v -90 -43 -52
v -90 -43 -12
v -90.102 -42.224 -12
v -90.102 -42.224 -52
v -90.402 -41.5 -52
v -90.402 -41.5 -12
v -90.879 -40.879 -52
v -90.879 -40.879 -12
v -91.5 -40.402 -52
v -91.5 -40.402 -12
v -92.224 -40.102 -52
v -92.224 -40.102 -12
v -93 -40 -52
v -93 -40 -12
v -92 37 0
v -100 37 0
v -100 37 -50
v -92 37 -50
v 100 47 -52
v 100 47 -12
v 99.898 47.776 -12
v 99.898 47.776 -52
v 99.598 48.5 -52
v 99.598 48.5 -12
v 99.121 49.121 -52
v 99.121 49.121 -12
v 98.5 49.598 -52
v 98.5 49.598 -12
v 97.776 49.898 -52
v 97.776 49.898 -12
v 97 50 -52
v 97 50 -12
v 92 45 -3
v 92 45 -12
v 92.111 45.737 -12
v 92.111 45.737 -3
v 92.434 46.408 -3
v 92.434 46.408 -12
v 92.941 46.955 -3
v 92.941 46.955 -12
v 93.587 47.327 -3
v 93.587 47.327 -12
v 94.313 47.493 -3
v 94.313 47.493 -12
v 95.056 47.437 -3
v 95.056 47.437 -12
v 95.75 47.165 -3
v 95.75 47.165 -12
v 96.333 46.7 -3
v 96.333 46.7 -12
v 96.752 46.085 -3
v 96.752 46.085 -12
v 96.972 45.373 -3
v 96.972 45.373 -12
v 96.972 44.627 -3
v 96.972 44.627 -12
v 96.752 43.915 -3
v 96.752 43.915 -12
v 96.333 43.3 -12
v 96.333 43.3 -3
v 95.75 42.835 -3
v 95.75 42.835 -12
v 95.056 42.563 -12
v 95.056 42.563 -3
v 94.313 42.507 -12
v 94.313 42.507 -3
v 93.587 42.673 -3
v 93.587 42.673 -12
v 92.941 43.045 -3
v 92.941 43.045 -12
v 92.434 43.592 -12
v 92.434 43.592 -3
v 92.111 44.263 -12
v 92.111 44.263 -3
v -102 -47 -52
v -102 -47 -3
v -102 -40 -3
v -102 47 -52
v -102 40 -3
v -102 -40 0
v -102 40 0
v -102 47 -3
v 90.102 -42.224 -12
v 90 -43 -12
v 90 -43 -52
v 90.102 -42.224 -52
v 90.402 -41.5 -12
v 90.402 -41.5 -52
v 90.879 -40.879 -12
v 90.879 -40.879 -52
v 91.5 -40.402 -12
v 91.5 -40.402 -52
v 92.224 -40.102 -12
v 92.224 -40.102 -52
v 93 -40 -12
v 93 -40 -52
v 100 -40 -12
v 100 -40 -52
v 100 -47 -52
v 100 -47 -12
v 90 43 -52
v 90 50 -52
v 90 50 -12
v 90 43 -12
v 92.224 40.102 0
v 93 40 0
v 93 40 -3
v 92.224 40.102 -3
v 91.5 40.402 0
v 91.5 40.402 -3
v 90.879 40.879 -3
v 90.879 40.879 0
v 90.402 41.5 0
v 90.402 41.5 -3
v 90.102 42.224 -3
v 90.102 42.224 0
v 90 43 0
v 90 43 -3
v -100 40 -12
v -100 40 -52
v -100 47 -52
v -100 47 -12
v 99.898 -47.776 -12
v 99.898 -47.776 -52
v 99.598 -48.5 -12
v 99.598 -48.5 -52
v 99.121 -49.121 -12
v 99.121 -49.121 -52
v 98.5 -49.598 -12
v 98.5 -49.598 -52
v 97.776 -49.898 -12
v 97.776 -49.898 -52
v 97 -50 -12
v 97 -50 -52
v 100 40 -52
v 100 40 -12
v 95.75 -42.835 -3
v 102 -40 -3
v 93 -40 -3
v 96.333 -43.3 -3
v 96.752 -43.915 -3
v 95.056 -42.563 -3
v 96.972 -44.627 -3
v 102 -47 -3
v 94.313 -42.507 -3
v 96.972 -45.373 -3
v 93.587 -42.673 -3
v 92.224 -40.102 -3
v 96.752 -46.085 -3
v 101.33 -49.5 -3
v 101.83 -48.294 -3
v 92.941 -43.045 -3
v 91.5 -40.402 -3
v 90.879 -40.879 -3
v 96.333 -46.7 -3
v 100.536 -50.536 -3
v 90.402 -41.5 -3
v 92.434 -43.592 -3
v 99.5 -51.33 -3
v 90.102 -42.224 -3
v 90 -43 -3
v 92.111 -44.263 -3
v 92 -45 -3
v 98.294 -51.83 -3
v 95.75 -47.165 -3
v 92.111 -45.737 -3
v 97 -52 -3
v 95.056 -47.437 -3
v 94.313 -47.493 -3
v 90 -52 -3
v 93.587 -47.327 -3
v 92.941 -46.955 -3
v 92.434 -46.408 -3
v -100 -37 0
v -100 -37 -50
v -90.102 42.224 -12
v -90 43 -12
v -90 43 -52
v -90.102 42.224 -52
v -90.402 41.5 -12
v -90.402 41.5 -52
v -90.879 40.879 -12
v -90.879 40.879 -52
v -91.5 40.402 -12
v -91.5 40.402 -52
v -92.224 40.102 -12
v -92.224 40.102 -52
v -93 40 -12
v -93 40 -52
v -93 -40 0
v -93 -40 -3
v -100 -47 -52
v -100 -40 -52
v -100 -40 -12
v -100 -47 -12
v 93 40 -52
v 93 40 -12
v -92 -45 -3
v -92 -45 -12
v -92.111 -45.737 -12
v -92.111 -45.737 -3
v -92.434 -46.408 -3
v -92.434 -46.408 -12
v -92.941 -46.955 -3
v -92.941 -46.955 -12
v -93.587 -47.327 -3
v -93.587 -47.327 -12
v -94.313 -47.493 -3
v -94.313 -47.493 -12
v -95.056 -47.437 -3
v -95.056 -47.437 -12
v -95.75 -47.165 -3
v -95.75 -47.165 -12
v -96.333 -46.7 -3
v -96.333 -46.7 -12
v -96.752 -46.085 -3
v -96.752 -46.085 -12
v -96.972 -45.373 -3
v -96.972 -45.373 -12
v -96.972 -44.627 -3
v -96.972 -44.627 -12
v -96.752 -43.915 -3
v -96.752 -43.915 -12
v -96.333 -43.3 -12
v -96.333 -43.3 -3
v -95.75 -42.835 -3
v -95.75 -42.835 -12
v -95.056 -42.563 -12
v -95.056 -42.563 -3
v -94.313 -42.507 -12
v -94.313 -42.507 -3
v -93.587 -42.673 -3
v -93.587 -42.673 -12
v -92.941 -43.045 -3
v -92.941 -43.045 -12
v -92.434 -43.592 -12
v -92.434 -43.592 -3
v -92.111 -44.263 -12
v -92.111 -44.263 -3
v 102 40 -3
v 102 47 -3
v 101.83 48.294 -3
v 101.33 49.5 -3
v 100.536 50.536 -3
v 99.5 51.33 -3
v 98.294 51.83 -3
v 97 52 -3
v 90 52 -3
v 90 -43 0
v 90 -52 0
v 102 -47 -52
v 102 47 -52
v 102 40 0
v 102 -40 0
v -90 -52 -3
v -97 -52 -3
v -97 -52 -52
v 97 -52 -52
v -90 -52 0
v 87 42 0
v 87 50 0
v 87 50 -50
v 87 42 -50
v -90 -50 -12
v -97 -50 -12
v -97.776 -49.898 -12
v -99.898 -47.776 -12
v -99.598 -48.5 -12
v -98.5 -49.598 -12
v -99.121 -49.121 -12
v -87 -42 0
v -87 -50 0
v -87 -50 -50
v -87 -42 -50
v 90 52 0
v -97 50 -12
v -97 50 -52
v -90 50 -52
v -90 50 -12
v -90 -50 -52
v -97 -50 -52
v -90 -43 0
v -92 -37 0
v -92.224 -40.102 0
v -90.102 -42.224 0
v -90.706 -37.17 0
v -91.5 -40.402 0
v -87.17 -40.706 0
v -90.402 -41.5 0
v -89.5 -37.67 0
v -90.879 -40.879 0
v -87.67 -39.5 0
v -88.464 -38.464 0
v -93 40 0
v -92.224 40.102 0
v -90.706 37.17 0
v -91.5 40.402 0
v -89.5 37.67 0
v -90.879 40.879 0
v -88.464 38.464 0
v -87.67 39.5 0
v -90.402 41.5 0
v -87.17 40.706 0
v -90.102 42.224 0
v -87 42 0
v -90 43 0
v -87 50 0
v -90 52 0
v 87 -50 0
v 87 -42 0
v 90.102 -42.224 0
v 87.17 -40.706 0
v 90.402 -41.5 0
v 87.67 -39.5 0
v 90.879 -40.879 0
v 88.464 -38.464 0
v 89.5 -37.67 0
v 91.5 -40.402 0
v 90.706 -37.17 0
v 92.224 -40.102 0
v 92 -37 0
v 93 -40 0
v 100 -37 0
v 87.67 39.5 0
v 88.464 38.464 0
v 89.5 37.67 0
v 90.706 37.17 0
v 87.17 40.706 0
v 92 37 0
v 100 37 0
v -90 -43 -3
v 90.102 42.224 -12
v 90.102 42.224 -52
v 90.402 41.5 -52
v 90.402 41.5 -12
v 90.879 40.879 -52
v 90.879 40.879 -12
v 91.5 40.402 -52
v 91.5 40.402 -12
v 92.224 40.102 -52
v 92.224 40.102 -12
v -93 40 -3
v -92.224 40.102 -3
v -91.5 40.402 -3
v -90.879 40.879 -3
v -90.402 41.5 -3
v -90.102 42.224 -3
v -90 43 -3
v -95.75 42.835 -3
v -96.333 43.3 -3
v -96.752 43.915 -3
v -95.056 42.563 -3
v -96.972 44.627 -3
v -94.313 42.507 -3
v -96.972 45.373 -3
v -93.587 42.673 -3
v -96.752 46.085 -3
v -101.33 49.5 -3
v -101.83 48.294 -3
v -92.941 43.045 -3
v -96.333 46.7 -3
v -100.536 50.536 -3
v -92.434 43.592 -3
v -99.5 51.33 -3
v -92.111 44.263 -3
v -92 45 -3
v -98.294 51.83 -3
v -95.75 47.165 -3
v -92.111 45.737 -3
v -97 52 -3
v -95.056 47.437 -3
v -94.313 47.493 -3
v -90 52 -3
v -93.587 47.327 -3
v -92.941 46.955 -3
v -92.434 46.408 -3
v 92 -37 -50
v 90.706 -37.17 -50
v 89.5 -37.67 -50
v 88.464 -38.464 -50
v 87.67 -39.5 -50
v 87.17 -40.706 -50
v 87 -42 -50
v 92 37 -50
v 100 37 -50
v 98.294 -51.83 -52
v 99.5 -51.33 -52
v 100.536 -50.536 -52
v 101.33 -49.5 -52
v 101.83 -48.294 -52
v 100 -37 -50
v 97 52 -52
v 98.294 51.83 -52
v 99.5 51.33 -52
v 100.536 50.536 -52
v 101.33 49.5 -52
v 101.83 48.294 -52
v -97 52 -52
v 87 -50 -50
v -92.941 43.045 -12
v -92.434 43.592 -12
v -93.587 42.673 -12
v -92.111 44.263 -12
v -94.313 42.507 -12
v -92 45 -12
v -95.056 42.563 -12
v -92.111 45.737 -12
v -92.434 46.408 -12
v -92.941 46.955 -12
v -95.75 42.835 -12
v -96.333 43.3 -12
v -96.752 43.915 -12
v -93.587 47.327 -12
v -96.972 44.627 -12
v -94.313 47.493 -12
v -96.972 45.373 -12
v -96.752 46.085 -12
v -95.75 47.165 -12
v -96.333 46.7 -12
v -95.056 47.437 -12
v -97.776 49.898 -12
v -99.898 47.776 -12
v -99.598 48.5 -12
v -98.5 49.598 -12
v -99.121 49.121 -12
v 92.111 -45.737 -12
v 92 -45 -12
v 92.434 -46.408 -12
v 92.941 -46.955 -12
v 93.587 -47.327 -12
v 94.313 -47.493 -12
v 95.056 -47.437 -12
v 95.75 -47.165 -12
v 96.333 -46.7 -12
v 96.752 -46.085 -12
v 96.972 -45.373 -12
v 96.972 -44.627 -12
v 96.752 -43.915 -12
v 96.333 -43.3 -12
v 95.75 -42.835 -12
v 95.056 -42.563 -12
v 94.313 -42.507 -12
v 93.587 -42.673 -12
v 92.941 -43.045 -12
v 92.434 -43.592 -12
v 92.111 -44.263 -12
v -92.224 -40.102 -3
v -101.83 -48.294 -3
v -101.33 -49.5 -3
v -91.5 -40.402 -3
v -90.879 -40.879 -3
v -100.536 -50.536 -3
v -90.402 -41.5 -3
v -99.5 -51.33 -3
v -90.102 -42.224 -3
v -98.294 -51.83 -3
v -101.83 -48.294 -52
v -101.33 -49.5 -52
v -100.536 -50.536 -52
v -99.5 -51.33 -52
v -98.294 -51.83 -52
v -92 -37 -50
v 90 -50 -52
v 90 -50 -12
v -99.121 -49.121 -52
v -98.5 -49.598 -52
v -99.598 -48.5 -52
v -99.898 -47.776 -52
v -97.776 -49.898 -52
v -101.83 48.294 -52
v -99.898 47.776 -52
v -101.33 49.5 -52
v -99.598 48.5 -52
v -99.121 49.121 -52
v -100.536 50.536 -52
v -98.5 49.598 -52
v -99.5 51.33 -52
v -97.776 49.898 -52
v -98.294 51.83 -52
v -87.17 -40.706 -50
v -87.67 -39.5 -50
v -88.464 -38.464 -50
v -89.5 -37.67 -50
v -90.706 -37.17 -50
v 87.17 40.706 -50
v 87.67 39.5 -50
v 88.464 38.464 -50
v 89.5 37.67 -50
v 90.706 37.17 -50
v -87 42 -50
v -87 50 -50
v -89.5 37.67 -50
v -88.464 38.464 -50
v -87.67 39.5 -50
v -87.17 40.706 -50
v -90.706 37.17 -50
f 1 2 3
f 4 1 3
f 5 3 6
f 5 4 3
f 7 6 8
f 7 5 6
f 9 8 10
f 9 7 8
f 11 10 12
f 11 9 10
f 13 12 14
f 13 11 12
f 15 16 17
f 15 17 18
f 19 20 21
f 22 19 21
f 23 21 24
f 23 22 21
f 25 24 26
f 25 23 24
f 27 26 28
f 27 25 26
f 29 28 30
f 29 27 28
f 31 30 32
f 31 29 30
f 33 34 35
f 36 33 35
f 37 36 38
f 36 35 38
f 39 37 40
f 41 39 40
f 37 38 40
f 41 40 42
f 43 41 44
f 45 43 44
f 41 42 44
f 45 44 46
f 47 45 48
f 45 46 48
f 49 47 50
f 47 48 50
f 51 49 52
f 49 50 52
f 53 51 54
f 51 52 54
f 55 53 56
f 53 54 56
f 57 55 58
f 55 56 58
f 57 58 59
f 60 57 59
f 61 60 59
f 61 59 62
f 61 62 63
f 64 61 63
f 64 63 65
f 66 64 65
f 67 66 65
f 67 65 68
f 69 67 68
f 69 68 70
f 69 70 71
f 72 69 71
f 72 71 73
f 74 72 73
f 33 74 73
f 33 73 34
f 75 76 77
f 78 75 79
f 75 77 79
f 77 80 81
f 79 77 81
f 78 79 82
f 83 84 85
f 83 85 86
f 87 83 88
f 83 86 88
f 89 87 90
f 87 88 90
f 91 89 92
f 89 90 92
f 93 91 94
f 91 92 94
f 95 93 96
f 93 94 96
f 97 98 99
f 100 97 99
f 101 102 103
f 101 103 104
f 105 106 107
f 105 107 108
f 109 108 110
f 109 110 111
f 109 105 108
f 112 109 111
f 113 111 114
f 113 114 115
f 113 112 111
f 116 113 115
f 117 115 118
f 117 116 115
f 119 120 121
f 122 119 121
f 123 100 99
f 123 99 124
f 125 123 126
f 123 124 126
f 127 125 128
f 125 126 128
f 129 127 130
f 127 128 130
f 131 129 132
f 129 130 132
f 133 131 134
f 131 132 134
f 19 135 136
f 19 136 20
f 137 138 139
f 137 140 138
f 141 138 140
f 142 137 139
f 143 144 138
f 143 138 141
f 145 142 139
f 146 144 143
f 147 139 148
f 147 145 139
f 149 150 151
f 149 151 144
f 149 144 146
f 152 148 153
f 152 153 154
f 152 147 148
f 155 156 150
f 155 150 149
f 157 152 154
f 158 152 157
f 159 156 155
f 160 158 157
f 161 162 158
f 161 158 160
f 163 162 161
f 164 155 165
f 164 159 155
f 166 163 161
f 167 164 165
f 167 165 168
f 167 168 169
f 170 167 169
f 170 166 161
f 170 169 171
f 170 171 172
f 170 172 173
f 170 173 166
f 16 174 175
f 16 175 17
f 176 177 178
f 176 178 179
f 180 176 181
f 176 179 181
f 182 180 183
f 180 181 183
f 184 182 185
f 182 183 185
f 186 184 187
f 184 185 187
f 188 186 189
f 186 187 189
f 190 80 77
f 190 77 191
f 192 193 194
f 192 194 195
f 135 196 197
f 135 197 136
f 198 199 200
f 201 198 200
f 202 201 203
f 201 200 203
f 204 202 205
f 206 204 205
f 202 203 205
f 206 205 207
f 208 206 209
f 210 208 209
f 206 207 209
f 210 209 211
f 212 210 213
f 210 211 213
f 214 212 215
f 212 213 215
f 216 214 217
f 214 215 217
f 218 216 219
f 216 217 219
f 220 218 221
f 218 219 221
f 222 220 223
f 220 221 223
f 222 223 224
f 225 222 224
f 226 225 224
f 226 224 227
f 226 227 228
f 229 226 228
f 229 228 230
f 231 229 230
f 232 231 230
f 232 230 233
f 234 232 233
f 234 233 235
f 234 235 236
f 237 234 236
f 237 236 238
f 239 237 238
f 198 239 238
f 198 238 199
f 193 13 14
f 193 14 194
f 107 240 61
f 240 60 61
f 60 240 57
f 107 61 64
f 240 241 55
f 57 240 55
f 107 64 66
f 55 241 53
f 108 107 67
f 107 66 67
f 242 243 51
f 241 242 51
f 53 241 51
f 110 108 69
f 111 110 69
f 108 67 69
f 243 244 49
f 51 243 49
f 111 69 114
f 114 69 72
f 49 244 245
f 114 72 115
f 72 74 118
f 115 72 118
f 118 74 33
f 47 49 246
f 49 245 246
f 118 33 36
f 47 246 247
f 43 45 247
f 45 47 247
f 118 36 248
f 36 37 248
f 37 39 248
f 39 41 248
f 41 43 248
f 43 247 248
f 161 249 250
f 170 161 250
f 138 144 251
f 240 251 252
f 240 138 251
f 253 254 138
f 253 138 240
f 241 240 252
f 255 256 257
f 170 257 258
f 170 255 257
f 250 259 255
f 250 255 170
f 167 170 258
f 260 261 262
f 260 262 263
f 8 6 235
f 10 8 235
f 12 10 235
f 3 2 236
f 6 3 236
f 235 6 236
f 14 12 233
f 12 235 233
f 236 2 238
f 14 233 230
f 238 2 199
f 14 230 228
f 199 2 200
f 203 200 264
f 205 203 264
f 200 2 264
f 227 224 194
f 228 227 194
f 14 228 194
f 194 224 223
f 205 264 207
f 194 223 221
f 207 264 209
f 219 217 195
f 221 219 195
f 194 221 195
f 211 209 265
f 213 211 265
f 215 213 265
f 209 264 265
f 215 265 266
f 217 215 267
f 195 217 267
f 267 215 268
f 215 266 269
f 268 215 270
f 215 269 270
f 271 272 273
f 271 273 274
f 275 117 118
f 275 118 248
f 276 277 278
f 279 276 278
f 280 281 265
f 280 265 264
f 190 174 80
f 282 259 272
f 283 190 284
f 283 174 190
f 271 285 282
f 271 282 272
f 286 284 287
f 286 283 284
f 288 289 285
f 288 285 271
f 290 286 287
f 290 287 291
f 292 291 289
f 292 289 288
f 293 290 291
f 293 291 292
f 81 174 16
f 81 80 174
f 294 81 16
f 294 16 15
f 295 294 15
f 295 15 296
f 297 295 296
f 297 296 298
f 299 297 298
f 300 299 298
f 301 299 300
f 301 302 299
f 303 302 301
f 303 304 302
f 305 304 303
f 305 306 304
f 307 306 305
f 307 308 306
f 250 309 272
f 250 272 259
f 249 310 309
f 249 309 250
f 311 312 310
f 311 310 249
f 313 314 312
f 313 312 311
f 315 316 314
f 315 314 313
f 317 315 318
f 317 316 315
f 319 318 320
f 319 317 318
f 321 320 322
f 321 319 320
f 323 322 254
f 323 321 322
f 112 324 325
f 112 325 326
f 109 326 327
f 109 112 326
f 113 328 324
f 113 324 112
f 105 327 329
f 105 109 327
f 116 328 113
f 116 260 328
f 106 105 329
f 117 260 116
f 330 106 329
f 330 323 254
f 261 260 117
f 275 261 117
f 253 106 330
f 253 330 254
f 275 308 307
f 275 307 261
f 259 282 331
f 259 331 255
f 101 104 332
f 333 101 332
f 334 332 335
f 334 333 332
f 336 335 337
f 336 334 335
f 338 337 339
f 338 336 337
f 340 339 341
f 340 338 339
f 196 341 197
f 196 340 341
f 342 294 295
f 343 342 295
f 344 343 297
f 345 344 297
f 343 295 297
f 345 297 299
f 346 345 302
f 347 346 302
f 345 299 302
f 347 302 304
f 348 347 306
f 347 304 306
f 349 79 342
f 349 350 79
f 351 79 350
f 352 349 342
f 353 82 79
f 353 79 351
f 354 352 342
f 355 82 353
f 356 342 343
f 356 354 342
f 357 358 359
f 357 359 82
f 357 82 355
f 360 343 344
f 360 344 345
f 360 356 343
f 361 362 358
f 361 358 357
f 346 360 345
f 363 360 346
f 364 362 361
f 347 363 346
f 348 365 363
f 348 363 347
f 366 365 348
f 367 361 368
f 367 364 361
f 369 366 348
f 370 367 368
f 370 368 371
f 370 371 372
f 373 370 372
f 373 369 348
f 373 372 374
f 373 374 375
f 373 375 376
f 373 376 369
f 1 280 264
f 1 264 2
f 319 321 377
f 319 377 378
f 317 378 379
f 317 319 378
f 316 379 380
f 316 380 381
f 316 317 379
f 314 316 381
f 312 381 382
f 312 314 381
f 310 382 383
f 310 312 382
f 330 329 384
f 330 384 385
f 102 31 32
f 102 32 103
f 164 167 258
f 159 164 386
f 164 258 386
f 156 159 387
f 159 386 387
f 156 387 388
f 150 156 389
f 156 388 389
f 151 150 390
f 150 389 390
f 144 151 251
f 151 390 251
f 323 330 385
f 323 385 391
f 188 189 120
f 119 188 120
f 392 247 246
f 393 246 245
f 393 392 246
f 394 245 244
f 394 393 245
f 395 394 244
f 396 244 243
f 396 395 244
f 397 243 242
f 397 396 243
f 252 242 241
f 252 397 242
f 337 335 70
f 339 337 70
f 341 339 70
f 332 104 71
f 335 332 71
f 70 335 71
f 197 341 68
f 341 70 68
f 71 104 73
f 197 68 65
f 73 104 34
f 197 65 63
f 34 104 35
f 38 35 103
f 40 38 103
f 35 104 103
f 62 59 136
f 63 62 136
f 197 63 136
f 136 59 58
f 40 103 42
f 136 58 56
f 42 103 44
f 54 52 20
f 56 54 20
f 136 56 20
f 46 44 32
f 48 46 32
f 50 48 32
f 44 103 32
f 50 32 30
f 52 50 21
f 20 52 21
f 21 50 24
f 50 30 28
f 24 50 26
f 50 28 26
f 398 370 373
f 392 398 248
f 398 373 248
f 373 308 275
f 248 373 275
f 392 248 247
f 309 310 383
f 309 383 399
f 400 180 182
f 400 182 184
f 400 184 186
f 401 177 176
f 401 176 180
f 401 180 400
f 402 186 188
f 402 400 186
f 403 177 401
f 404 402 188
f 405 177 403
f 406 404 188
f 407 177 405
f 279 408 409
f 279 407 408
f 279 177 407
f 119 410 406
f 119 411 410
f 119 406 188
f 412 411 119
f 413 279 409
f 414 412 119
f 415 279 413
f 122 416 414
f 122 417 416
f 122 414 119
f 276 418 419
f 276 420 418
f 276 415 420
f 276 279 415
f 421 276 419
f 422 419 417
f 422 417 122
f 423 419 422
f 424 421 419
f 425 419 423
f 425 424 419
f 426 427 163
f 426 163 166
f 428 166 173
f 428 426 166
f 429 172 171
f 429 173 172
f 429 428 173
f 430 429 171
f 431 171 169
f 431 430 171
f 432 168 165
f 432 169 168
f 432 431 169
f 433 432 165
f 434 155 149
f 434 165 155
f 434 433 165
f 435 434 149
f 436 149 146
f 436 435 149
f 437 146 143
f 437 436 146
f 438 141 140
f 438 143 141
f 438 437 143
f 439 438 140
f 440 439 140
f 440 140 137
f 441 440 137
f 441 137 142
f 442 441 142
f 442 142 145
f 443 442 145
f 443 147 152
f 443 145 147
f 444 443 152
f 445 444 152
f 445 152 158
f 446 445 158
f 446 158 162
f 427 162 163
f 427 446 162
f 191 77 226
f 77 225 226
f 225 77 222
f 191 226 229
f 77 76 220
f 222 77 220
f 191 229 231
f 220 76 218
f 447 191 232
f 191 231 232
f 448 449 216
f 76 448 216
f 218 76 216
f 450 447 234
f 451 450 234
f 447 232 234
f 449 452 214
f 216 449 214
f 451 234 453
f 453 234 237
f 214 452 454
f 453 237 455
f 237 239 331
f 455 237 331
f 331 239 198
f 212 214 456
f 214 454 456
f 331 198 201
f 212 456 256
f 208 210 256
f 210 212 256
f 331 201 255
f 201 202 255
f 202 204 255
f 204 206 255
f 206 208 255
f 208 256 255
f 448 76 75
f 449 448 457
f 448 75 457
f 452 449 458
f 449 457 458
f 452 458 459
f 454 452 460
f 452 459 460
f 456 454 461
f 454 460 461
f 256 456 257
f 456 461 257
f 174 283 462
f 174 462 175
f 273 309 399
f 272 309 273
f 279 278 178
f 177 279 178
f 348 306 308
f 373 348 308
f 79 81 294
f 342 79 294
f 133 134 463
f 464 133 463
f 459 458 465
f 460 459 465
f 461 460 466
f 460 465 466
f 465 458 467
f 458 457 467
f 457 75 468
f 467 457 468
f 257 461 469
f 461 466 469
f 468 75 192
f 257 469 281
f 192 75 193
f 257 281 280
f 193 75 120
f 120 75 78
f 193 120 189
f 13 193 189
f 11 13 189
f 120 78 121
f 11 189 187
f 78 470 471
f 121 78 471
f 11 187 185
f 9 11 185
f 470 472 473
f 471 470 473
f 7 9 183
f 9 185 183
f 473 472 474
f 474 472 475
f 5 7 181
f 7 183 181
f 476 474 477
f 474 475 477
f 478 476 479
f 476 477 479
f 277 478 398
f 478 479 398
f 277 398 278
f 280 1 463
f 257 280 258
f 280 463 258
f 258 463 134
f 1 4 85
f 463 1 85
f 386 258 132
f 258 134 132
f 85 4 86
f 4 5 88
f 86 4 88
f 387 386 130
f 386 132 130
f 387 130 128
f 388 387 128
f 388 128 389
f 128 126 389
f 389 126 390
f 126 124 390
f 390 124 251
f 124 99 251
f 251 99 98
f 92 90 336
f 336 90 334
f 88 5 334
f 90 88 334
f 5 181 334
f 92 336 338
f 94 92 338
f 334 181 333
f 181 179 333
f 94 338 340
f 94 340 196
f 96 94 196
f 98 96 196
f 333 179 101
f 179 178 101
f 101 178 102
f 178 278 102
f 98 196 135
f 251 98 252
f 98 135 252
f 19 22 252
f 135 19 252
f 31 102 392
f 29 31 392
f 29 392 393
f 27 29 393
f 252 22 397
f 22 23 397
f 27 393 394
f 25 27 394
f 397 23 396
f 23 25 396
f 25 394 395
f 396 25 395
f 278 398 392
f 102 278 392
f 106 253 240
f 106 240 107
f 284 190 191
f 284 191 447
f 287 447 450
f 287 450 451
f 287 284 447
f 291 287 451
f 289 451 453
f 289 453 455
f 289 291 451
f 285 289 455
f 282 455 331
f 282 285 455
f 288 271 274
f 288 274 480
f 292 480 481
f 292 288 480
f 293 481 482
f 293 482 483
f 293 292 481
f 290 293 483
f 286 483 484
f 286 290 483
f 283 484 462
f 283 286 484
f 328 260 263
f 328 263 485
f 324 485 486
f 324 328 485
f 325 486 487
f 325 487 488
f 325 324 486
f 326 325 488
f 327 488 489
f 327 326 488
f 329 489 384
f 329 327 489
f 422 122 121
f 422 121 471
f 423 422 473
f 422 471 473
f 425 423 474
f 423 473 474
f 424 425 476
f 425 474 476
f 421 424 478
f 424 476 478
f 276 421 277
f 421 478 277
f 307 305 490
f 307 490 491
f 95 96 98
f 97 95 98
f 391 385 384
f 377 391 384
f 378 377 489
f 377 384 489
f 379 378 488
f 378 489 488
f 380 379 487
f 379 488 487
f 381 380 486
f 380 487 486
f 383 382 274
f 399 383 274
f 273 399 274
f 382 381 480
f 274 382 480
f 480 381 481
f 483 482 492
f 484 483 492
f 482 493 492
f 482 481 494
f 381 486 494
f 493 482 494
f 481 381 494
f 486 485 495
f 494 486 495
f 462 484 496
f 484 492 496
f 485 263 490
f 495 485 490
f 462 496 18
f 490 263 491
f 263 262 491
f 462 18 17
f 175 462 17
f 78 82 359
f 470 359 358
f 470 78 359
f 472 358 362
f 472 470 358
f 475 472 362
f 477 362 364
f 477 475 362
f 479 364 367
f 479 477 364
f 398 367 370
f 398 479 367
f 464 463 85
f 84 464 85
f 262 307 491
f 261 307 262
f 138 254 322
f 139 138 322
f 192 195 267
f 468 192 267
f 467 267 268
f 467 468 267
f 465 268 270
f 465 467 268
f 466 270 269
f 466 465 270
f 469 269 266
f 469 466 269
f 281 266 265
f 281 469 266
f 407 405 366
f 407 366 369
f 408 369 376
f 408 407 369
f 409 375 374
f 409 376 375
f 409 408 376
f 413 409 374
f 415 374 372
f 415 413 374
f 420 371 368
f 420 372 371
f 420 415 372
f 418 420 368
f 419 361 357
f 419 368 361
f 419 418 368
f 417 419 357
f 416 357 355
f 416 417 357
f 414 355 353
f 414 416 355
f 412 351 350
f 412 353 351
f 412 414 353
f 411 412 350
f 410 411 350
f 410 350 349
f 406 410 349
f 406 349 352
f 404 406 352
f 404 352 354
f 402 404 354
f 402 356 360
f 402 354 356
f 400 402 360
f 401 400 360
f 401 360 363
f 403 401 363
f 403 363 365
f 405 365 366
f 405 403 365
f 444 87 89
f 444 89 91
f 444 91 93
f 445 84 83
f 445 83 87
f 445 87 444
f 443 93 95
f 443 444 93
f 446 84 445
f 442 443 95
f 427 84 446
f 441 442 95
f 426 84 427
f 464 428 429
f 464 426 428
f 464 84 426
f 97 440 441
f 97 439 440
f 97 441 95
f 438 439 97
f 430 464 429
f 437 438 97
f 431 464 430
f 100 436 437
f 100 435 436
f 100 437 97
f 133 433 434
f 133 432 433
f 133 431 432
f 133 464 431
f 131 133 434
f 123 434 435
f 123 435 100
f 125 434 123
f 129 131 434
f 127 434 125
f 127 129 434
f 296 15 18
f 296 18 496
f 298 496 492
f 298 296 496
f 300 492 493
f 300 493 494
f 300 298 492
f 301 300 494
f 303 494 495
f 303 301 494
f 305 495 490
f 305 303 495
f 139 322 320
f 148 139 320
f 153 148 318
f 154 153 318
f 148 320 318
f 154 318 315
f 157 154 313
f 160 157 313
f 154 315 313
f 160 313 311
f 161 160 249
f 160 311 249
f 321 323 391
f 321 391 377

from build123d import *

# Parameters (mm, degrees)
ESBO_O1_W                 = 204
ESBO_O1_H                 = 104
RESSALTO_EXTRUS_O1_DEPTH  = 52
CORTE_EXTRUS_O1_DEPTH     = 50
FILETE1_R                 = 5
CORTE_EXTRUS_O2_DEPTH     = 40
CORTE_EXTRUS_O5_DEPTH     = 3
CORTE_EXTRUS_O6_START     = -53
ESBO_O8_R                 = 2.5
CORTE_EXTRUS_O6_DEPTH     = 54
ESPELHAR2_COPY_1_DEPTH    = 40
ESPELHAR2_COPY_2_DEPTH    = 3
ESPELHAR2_START           = -53
ESPELHAR2_COPY_3_SKETCH_R = 2.5
ESPELHAR2_COPY_3_DEPTH    = 54


with BuildPart() as part:
    # Esboço1 → Ressalto-extrusão1 (new body)
    with BuildSketch(Plane.XY):
        Rectangle(ESBO_O1_W, ESBO_O1_H)
    extrude(amount=-RESSALTO_EXTRUS_O1_DEPTH)

    # Esboço2 → Corte-extrusão1 (cut)
    with BuildSketch(Plane.XY):
        with BuildLine():
            Line((-87, 50), (87, 50))
            Line((87, 50), (87, 42))
            ThreePointArc((87, 42), (88.464466094, 38.464466094), (92, 37))
            Line((92, 37), (100, 37))
            Line((100, 37), (100, -37))
            Line((100, -37), (92, -37))
            ThreePointArc((92, -37), (88.464466094, -38.464466094), (87, -42))
            Line((87, -42), (87, -50))
            Line((87, -50), (-87, -50))
            Line((-87, -50), (-87, -42))
            ThreePointArc((-87, -42), (-88.464466094, -38.464466094), (-92, -37))
            Line((-92, -37), (-100, -37))
            Line((-100, -37), (-100, 37))
            Line((-100, 37), (-92, 37))
            ThreePointArc((-92, 37), (-88.464466094, 38.464466094), (-87, 42))
            Line((-87, 42), (-87, 50))
        make_face()
    extrude(amount=-CORTE_EXTRUS_O1_DEPTH, mode=Mode.SUBTRACT)

    # Filete1
    filete1_edges = [part.edges().sort_by_distance(p)[0] for p in [
        (102, -52, -26),
        (-102, -52, -26),
        (-102, 52, -26),
        (102, 52, -26),
    ]]
    fillet(filete1_edges, radius=FILETE1_R)

    # Esboço4 → Corte-extrusão2 (cut)
    with BuildSketch(Plane(origin=(0, 0, -52), x_dir=(-1, 0, 0), z_dir=(0, 0, -1))):
        with BuildLine():
            Line((-97, 50), (-90, 50))
            Line((-90, 50), (-90, 43))
            ThreePointArc((-90, 43), (-90.878679656, 40.878679656), (-93, 40))
            Line((-93, 40), (-100, 40))
            Line((-100, 40), (-100, 47))
            ThreePointArc((-100, 47), (-99.121320344, 49.121320344), (-97, 50))
        make_face()
    corte_extrus_o2 = extrude(amount=-CORTE_EXTRUS_O2_DEPTH, mode=Mode.SUBTRACT)

    # Esboço7 → Corte-extrusão5 (cut)
    with BuildSketch(Plane.XY):
        with BuildLine():
            Line((-102, 40), (-93, 40))
            ThreePointArc((-93, 40), (-90.878679656, 40.878679656), (-90, 43))
            Line((-90, 43), (-90, 52))
            Line((-90, 52), (-97, 52))
            ThreePointArc((-97, 52), (-100.535533906, 50.535533906), (-102, 47))
            Line((-102, 47), (-102, 40))
        make_face()
    corte_extrus_o5 = extrude(amount=-CORTE_EXTRUS_O5_DEPTH, mode=Mode.SUBTRACT)

    # Esboço8 → Corte-extrusão6 (cut)
    with BuildSketch(Plane.XY.offset(CORTE_EXTRUS_O6_START)):
        with Locations((-94.5, 45)):
            Circle(ESBO_O8_R)
    corte_extrus_o6 = extrude(amount=CORTE_EXTRUS_O6_DEPTH, mode=Mode.SUBTRACT)

    # Espelhar1: Corte-extrusão2, Corte-extrusão5, Corte-extrusão6 across plane
    add(corte_extrus_o2.mirror(Plane(origin=(0, 0, 0), x_dir=(0, 0, 1), z_dir=(1, 0, 0))), mode=Mode.SUBTRACT)
    add(corte_extrus_o5.mirror(Plane(origin=(0, 0, 0), x_dir=(0, 0, 1), z_dir=(1, 0, 0))), mode=Mode.SUBTRACT)
    add(corte_extrus_o6.mirror(Plane(origin=(0, 0, 0), x_dir=(0, 0, 1), z_dir=(1, 0, 0))), mode=Mode.SUBTRACT)

    # Espelhar2: Corte-extrusão2, Corte-extrusão5, Corte-extrusão6 across plane
    add(corte_extrus_o2.mirror(Plane.ZX), mode=Mode.SUBTRACT)
    add(corte_extrus_o5.mirror(Plane.ZX), mode=Mode.SUBTRACT)
    add(corte_extrus_o6.mirror(Plane.ZX), mode=Mode.SUBTRACT)

    # Espelhar2 copy 1 sketch → Espelhar2 copy 1 (cut)
    with BuildSketch(Plane(origin=(0, 0, -52), x_dir=(1, 0, 0), z_dir=(0, 0, -1))):
        with BuildLine():
            Line((-97, 50), (-90, 50))
            Line((-90, 50), (-90, 43))
            ThreePointArc((-90, 43), (-90.878679656, 40.878679656), (-93, 40))
            Line((-93, 40), (-100, 40))
            Line((-100, 40), (-100, 47))
            ThreePointArc((-100, 47), (-99.121320344, 49.121320344), (-97, 50))
        make_face()
    extrude(amount=-ESPELHAR2_COPY_1_DEPTH, mode=Mode.SUBTRACT)

    # Espelhar2 copy 2 sketch → Espelhar2 copy 2 (cut)
    with BuildSketch(Plane(origin=(0, 0, 0), x_dir=(-1, 0, 0), z_dir=(0, 0, 1))):
        with BuildLine():
            Line((-102, 40), (-93, 40))
            ThreePointArc((-93, 40), (-90.878679656, 40.878679656), (-90, 43))
            Line((-90, 43), (-90, 52))
            Line((-90, 52), (-97, 52))
            ThreePointArc((-97, 52), (-100.535533906, 50.535533906), (-102, 47))
            Line((-102, 47), (-102, 40))
        make_face()
    extrude(amount=-ESPELHAR2_COPY_2_DEPTH, mode=Mode.SUBTRACT)

    # Espelhar2 copy 3 sketch → Espelhar2 copy 3 (cut)
    with BuildSketch(Plane(origin=(0, 0, 0), x_dir=(-1, 0, 0), z_dir=(0, 0, 1)).offset(ESPELHAR2_START)):
        with Locations((-94.5, 45)):
            Circle(ESPELHAR2_COPY_3_SKETCH_R)
    extrude(amount=ESPELHAR2_COPY_3_DEPTH, mode=Mode.SUBTRACT)


solid = part.part
